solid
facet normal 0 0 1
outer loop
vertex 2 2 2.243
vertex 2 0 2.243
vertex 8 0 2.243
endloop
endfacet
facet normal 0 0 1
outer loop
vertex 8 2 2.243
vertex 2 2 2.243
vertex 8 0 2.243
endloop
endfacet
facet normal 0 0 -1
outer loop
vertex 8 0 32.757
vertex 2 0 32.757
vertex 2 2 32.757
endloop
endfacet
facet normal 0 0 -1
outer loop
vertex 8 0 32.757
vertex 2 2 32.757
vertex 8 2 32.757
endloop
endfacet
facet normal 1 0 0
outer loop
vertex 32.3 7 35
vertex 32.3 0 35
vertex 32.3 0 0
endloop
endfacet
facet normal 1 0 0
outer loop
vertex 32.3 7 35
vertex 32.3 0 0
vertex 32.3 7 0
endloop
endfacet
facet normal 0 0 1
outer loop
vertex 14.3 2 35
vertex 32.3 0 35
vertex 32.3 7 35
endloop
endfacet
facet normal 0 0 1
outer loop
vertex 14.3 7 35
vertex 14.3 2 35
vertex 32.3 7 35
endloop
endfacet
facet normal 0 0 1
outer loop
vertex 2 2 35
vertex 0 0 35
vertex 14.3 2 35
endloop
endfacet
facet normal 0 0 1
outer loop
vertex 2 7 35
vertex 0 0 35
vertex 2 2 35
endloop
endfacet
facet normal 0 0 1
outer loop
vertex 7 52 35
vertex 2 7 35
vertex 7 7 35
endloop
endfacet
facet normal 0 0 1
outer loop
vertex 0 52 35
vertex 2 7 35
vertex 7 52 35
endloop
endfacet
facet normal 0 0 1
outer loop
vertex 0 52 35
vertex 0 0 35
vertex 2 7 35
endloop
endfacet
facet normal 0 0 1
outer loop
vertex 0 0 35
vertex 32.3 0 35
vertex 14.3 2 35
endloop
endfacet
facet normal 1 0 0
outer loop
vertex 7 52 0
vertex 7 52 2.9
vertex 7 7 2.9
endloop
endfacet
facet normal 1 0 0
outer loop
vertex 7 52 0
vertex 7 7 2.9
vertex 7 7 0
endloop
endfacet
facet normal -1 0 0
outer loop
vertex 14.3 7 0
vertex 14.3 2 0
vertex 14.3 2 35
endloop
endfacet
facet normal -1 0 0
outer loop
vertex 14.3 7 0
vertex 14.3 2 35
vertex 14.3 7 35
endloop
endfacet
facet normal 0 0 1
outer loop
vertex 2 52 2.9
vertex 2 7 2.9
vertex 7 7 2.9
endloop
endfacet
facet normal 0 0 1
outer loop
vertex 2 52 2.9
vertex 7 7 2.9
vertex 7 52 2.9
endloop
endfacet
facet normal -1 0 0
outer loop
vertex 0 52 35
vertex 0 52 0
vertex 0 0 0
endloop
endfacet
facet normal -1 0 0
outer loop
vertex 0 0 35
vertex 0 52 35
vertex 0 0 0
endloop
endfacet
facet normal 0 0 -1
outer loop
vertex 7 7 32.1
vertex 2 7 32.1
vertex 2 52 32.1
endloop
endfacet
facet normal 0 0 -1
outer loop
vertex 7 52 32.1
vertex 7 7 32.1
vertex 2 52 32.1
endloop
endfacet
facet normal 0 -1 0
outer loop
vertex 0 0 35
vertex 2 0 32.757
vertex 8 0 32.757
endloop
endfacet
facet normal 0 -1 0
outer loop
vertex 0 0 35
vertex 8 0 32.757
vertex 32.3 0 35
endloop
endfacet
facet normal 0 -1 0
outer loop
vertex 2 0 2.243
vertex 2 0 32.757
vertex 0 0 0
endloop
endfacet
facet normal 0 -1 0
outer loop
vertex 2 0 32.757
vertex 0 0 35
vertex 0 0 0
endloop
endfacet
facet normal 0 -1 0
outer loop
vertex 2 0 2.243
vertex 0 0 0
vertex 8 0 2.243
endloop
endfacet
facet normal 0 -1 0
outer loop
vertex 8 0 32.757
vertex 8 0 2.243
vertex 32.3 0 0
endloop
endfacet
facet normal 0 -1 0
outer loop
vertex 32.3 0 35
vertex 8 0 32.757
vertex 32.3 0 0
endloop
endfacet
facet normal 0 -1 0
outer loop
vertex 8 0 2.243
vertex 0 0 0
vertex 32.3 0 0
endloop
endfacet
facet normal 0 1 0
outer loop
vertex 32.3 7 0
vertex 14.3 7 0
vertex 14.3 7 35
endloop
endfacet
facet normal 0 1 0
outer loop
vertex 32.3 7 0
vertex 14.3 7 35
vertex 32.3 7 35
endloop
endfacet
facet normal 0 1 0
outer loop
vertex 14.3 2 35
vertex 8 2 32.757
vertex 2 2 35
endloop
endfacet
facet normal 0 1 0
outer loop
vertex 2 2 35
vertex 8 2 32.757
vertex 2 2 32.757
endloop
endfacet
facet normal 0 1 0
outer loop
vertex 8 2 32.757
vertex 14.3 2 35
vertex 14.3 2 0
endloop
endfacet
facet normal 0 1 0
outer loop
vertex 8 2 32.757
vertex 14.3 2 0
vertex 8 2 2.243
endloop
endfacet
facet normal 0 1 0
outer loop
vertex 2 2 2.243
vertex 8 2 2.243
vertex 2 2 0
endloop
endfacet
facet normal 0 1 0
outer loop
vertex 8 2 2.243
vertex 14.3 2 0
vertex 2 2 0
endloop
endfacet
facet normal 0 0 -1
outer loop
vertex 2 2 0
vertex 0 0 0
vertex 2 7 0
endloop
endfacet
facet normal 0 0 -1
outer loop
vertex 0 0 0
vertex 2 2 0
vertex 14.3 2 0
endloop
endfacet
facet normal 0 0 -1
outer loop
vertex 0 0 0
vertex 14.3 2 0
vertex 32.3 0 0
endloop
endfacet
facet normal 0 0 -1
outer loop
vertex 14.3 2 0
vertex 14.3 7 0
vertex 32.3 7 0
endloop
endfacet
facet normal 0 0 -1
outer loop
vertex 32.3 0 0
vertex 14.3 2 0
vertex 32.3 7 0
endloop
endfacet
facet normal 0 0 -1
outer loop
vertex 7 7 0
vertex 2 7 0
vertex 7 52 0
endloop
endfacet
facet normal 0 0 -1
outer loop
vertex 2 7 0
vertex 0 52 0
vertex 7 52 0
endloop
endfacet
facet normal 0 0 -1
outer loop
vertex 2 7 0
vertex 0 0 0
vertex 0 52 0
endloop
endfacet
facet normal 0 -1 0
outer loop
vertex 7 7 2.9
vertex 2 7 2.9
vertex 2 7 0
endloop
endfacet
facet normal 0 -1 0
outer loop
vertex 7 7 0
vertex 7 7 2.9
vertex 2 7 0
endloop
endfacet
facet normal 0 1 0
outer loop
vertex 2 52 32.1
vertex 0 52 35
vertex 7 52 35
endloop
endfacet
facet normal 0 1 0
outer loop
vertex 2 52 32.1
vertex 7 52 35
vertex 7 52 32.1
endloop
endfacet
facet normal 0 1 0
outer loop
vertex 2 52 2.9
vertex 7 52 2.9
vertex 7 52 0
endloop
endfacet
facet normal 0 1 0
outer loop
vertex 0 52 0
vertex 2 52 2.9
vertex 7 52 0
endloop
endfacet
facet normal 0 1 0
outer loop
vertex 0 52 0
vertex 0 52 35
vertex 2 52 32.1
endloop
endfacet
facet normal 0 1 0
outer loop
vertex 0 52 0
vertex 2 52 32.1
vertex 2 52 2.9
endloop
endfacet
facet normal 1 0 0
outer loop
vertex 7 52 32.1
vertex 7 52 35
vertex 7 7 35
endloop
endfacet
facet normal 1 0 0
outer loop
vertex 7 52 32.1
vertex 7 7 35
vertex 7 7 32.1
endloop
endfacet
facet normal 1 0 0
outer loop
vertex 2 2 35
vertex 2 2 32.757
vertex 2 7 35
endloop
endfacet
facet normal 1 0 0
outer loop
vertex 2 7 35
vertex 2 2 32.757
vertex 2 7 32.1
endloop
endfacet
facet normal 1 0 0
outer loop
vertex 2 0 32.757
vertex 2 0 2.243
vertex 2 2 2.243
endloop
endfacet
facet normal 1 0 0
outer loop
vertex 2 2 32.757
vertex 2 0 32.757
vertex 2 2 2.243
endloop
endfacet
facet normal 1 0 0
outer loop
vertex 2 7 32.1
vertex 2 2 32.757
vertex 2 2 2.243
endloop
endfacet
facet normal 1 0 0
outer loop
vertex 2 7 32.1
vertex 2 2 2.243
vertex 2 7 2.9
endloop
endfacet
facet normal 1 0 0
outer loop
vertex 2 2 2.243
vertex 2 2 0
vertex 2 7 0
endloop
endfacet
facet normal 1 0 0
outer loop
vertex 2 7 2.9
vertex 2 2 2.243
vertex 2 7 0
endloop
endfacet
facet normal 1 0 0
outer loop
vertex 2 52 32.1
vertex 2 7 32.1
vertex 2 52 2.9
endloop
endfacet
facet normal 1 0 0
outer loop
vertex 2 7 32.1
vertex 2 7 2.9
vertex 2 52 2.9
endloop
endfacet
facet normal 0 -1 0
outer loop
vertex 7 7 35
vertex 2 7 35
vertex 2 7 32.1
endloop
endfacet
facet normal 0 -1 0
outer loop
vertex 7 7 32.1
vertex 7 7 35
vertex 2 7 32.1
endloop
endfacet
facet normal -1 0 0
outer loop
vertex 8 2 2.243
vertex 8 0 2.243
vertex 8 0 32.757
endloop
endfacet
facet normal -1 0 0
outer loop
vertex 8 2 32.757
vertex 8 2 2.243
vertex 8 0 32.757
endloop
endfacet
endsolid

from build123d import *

# Parameters (mm, degrees)
SKETCH1_W           = 18
SKETCH1_H           = 5
SKETCH1_W_2         = 2
SKETCH1_H_2         = 2
SKETCH1_H_3         = 50
BOSS_EXTRUDE1_DEPTH = 35
SKETCH2_W           = 2.9
SKETCH2_H           = 45
BOSS_EXTRUDE2_DEPTH = 5
SKETCH3_W           = 6
SKETCH3_H           = 30.514407746
CUT_EXTRUDE1_DEPTH  = 5


with BuildPart() as part:
    # Sketch1 → Boss-Extrude1 (new body)
    with BuildSketch(Plane.XY):
        with Locations((23.3, 4.5)):
            Rectangle(SKETCH1_W, SKETCH1_H)
        Polygon((2, 2), (2, 0), (32.3, 0), (32.3, 2), (14.3, 2), align=None)
        with Locations((1, 1)):
            Rectangle(SKETCH1_W_2, SKETCH1_H_2)
        with Locations((1, 27)):
            Rectangle(SKETCH1_W_2, SKETCH1_H_3)
    extrude(amount=BOSS_EXTRUDE1_DEPTH)

    # Sketch2 → Boss-Extrude2 (add)
    with BuildSketch(Plane(origin=(2, 0, 0), x_dir=(0, 0, -1), z_dir=(1, 0, 0))):
        with Locations((-33.55, 29.5)):
            Rectangle(SKETCH2_W, SKETCH2_H)
        with Locations((-1.45, 29.5)):
            Rectangle(SKETCH2_W, SKETCH2_H)
    extrude(amount=BOSS_EXTRUDE2_DEPTH)

    # Sketch3 → Cut-Extrude1 (cut)
    with BuildSketch(Plane.XZ):
        with Locations((5, 17.5)):
            Rectangle(SKETCH3_W, SKETCH3_H)
    extrude(amount=-CUT_EXTRUDE1_DEPTH, mode=Mode.SUBTRACT)


solid = part.part
